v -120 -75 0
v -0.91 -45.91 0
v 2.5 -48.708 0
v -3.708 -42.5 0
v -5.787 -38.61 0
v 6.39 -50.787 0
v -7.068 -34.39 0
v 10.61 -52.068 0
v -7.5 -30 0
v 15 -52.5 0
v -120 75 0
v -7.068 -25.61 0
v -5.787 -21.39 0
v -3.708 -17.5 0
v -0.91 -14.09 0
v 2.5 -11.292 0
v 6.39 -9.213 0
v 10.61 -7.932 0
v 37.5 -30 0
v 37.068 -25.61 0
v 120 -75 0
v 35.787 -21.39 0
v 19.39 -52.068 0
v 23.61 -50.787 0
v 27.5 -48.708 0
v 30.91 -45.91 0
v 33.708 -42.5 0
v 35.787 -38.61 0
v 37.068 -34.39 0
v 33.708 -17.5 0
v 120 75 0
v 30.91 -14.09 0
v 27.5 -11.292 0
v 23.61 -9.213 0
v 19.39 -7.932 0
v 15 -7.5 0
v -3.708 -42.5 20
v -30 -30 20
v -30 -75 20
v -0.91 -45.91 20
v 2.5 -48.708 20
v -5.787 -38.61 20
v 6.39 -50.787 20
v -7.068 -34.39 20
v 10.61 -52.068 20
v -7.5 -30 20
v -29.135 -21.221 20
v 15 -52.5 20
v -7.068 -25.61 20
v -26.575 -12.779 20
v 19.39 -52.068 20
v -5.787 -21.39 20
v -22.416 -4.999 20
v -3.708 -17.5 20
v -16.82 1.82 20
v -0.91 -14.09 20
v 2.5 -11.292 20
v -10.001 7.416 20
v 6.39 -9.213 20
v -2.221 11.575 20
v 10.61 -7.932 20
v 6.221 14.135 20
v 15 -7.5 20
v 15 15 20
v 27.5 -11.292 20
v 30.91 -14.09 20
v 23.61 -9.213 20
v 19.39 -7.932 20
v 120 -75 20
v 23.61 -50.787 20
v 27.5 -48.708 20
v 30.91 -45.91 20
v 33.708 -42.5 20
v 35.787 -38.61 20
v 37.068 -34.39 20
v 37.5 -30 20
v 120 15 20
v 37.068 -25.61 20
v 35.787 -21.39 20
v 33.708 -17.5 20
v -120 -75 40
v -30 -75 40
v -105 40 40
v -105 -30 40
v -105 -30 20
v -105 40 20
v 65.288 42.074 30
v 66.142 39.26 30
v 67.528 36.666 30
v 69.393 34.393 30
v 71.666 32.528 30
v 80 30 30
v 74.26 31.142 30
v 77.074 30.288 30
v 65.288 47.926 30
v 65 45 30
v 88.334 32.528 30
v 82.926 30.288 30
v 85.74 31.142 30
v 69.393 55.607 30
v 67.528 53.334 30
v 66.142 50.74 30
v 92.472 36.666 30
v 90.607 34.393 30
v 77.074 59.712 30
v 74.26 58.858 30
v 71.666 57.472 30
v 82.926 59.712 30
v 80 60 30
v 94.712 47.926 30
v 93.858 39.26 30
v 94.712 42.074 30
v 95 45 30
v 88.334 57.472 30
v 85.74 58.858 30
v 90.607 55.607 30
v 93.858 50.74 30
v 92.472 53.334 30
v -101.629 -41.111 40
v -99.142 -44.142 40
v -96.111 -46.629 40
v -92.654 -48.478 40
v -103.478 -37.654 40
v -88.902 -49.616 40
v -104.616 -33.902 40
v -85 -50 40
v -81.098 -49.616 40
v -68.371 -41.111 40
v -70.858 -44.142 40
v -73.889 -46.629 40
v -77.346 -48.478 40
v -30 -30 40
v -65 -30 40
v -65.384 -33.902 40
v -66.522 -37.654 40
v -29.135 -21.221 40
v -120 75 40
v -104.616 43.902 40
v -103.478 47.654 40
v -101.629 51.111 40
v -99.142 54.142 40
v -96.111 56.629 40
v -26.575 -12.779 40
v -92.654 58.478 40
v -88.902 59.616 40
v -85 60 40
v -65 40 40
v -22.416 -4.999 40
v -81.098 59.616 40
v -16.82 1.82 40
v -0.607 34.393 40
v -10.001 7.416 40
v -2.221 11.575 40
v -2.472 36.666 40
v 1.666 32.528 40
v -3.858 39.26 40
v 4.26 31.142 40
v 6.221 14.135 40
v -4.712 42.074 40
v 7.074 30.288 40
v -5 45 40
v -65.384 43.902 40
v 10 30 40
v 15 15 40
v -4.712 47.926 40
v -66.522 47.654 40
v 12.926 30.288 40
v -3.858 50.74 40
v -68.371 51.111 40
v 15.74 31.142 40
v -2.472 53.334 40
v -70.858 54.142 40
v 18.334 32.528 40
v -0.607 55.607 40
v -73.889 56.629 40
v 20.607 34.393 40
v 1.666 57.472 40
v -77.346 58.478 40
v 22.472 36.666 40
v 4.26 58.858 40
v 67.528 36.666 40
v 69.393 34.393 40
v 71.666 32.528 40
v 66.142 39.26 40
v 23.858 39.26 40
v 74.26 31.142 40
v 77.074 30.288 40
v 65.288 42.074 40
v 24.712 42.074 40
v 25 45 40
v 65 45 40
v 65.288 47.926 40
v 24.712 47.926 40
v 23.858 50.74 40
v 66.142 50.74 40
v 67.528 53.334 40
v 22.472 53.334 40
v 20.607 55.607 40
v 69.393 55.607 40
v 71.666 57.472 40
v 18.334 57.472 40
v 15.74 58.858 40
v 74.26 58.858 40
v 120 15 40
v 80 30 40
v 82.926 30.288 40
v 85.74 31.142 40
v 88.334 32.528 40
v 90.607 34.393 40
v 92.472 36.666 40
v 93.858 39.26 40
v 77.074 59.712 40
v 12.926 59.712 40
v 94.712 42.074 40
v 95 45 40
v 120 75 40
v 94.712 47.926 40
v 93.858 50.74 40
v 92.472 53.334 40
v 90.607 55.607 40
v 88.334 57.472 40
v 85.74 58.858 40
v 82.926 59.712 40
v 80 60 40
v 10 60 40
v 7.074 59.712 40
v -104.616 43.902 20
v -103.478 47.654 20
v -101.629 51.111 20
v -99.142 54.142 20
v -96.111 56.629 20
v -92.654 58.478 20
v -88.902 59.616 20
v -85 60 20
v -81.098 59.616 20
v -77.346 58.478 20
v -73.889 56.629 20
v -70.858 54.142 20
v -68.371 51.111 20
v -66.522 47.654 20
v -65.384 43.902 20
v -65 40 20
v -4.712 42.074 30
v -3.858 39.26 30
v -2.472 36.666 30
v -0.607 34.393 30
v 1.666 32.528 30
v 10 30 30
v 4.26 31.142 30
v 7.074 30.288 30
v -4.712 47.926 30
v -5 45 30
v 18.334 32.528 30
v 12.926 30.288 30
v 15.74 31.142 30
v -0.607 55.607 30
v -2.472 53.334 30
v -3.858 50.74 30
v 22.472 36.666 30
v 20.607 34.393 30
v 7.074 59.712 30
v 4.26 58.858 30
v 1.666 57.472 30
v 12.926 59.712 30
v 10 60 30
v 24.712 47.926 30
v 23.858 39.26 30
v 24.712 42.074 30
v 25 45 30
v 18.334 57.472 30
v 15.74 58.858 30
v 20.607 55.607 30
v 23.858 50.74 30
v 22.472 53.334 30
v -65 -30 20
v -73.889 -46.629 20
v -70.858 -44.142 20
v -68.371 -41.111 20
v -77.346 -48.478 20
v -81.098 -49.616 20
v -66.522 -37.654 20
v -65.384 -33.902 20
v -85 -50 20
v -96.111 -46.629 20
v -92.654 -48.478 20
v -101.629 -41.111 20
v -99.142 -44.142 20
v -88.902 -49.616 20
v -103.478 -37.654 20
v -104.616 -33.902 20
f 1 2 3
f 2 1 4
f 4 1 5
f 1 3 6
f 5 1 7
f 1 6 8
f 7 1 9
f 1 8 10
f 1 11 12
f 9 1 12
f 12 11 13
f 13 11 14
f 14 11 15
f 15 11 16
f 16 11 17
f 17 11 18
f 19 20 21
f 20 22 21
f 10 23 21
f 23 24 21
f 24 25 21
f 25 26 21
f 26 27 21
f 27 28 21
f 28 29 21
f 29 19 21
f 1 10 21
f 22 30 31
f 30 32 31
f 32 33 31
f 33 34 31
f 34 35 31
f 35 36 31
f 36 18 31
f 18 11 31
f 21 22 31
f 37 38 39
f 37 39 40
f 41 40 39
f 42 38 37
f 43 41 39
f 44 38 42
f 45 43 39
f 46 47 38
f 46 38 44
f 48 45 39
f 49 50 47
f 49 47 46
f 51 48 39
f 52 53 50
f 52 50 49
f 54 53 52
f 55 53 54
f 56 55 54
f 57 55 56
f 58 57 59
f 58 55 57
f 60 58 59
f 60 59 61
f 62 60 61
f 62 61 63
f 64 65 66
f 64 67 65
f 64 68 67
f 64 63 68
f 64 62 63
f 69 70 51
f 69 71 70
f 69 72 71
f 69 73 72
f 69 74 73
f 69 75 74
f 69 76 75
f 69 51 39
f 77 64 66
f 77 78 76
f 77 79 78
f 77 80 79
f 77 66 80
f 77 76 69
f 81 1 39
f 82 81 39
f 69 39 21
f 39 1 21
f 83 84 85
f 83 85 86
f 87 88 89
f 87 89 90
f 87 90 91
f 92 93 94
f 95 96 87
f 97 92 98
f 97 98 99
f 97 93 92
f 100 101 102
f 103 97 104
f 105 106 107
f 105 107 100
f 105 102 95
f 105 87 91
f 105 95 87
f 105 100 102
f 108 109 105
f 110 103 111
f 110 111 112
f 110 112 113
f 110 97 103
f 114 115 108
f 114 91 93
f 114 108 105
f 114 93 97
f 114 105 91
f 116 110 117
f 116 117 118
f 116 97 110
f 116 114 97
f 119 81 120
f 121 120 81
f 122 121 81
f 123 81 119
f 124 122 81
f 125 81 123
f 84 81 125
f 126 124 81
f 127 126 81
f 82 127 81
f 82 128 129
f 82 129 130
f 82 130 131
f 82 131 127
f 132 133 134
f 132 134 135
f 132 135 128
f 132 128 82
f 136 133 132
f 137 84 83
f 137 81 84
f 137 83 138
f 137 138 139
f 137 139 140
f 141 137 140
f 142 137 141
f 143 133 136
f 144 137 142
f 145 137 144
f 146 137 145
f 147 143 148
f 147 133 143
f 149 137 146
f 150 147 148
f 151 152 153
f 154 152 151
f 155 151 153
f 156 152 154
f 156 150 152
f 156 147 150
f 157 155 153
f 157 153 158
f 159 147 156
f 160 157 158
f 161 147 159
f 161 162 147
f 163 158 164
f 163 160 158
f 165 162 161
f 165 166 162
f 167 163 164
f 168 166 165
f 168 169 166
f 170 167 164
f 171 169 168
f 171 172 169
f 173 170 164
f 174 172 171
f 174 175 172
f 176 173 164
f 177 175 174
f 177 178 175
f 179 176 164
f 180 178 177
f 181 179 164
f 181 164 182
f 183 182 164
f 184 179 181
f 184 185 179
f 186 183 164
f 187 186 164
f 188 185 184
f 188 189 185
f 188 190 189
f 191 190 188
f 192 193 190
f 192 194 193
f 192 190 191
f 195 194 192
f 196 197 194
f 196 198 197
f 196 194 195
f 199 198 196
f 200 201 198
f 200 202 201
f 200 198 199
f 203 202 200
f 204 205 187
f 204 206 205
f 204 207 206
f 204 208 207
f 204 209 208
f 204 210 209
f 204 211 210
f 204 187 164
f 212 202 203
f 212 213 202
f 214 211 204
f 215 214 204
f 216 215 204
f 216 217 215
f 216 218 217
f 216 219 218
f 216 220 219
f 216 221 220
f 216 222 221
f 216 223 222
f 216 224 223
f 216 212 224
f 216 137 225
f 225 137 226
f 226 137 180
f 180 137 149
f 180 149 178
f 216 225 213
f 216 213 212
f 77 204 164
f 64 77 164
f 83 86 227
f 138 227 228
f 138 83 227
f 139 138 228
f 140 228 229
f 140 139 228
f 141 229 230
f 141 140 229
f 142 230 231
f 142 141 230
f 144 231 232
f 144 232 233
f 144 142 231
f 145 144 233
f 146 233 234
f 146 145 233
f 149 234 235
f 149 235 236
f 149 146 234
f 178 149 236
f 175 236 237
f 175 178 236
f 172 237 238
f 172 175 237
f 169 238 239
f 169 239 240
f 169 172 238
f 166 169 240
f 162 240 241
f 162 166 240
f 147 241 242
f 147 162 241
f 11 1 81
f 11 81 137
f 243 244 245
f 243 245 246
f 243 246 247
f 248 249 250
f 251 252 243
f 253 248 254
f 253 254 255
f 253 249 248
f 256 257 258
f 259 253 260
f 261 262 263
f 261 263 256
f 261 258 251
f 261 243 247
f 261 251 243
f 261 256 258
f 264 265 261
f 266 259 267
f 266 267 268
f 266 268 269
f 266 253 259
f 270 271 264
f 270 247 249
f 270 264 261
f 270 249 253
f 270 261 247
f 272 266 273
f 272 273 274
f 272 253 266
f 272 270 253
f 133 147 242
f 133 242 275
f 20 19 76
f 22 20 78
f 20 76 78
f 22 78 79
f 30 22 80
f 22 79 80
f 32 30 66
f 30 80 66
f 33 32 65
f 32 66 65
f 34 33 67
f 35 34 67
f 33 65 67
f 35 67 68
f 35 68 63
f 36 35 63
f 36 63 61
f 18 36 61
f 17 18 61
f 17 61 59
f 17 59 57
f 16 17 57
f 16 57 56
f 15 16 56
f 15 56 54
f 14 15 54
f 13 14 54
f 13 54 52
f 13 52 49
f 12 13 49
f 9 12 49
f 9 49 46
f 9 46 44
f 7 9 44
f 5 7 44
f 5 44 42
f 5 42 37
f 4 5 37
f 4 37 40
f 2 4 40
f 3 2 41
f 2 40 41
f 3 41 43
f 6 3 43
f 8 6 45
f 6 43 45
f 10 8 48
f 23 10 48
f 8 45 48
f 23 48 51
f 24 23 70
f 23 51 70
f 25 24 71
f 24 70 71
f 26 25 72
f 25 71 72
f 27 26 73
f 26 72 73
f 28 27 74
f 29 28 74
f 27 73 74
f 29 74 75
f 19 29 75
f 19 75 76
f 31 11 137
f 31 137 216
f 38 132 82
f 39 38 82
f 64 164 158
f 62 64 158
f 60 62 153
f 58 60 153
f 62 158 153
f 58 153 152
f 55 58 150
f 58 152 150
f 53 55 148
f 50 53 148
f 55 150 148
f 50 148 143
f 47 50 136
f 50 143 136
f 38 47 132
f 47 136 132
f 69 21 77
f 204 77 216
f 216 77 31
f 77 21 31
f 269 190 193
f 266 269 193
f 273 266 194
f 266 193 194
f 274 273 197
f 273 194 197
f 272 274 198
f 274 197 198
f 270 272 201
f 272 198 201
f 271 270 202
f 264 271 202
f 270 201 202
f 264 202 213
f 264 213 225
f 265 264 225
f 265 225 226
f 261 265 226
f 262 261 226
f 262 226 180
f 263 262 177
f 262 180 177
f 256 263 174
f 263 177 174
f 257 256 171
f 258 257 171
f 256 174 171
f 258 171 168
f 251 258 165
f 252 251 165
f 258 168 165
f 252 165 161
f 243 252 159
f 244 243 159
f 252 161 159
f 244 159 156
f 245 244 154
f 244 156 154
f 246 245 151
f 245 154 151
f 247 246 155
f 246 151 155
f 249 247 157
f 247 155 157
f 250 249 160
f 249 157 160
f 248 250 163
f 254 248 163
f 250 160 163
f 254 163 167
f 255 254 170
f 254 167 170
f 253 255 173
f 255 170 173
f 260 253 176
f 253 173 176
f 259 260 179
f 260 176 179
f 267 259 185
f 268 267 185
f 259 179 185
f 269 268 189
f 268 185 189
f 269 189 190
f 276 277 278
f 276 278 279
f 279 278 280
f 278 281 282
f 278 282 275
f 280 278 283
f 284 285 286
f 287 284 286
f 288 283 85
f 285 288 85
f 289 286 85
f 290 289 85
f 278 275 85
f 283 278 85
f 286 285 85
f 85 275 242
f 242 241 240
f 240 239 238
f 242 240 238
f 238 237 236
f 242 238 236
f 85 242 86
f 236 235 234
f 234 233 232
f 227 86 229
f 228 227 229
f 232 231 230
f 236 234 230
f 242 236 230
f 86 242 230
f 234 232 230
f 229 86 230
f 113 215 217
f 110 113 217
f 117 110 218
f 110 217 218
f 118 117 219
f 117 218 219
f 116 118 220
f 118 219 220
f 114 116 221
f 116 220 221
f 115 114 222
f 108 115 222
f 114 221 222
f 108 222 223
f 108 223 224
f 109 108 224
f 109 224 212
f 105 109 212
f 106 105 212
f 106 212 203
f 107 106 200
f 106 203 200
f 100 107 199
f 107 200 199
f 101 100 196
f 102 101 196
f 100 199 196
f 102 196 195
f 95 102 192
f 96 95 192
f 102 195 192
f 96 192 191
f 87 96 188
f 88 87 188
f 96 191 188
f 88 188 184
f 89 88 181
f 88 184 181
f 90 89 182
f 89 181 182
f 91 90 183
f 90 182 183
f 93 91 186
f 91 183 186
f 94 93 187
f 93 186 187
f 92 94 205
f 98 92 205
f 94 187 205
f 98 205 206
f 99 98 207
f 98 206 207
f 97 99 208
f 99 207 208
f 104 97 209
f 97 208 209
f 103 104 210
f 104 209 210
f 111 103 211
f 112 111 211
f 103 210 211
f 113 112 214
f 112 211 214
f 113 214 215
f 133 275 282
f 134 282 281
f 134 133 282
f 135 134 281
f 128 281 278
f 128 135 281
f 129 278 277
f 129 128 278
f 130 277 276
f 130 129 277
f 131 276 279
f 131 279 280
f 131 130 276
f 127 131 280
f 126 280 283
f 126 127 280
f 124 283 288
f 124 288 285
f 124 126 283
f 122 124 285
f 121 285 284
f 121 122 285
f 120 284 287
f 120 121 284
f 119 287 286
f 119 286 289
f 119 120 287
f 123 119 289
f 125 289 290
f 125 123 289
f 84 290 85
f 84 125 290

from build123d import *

# Parameters (mm, degrees)
ESQUISSE1_W             = 240
ESQUISSE1_H             = 150
BOSS_EXTRU_1_DEPTH      = 40
ENL_V_MAT_EXTRU_1_DEPTH = 20
ESQUISSE2_3_R           = 15
ENL_V_MAT_EXTRU_2_DEPTH = 10
ESQUISSE2_4_R           = 22.5
ENL_V_MAT_EXTRU_3_DEPTH = 148.054411699
ESQUISSE2_5_R           = 22.5
ENL_V_MAT_EXTRU_4_DEPTH = 20


with BuildPart() as part:
    # Esquisse1 → Boss.-Extru.1 (new body)
    with BuildSketch(Plane.XY):
        Rectangle(ESQUISSE1_W, ESQUISSE1_H)
    extrude(amount=BOSS_EXTRU_1_DEPTH)

    # Esquisse2 → Enlèv. mat.-Extru.1 (cut)
    with BuildSketch(Plane.XY.offset(40)):
        with BuildLine():
            Line((-105, 40), (-105, -30))
            ThreePointArc((-105, -30), (-85, -50), (-65, -30))
            Line((-65, -30), (-65, 40))
            ThreePointArc((-65, 40), (-85, 60), (-105, 40))
        make_face()
    extrude(amount=-ENL_V_MAT_EXTRU_1_DEPTH, mode=Mode.SUBTRACT)

    # Esquisse2<3> → Enlèv. mat.-Extru.2 (cut)
    with BuildSketch(Plane.XY.offset(40)):
        with Locations((10, 45)):
            Circle(ESQUISSE2_3_R)
        with Locations((80, 45)):
            Circle(ESQUISSE2_3_R)
    extrude(amount=-ENL_V_MAT_EXTRU_2_DEPTH, mode=Mode.SUBTRACT)

    # Esquisse2<4> → Enlèv. mat.-Extru.3 (cut, through all)
    with BuildSketch(Plane.XY.offset(40)):
        with Locations((15, -30)):
            Circle(ESQUISSE2_4_R)
    extrude(amount=-ENL_V_MAT_EXTRU_3_DEPTH, mode=Mode.SUBTRACT)

    # Esquisse2<5> → Enlèv. mat.-Extru.4 (cut)
    with BuildSketch(Plane.XY.offset(40)):
        with BuildLine():
            Line((120, -75), (120, 15))
            Line((120, 15), (15, 15))
            ThreePointArc((15, 15), (-16.819805153, 1.819805153), (-30, -30))
            Line((-30, -30), (-30, -75))
            Line((-30, -75), (120, -75))
        make_face()
        with Locations((15, -30)):
            Circle(ESQUISSE2_5_R, mode=Mode.SUBTRACT)
    extrude(amount=-ENL_V_MAT_EXTRU_4_DEPTH, mode=Mode.SUBTRACT)


solid = part.part
